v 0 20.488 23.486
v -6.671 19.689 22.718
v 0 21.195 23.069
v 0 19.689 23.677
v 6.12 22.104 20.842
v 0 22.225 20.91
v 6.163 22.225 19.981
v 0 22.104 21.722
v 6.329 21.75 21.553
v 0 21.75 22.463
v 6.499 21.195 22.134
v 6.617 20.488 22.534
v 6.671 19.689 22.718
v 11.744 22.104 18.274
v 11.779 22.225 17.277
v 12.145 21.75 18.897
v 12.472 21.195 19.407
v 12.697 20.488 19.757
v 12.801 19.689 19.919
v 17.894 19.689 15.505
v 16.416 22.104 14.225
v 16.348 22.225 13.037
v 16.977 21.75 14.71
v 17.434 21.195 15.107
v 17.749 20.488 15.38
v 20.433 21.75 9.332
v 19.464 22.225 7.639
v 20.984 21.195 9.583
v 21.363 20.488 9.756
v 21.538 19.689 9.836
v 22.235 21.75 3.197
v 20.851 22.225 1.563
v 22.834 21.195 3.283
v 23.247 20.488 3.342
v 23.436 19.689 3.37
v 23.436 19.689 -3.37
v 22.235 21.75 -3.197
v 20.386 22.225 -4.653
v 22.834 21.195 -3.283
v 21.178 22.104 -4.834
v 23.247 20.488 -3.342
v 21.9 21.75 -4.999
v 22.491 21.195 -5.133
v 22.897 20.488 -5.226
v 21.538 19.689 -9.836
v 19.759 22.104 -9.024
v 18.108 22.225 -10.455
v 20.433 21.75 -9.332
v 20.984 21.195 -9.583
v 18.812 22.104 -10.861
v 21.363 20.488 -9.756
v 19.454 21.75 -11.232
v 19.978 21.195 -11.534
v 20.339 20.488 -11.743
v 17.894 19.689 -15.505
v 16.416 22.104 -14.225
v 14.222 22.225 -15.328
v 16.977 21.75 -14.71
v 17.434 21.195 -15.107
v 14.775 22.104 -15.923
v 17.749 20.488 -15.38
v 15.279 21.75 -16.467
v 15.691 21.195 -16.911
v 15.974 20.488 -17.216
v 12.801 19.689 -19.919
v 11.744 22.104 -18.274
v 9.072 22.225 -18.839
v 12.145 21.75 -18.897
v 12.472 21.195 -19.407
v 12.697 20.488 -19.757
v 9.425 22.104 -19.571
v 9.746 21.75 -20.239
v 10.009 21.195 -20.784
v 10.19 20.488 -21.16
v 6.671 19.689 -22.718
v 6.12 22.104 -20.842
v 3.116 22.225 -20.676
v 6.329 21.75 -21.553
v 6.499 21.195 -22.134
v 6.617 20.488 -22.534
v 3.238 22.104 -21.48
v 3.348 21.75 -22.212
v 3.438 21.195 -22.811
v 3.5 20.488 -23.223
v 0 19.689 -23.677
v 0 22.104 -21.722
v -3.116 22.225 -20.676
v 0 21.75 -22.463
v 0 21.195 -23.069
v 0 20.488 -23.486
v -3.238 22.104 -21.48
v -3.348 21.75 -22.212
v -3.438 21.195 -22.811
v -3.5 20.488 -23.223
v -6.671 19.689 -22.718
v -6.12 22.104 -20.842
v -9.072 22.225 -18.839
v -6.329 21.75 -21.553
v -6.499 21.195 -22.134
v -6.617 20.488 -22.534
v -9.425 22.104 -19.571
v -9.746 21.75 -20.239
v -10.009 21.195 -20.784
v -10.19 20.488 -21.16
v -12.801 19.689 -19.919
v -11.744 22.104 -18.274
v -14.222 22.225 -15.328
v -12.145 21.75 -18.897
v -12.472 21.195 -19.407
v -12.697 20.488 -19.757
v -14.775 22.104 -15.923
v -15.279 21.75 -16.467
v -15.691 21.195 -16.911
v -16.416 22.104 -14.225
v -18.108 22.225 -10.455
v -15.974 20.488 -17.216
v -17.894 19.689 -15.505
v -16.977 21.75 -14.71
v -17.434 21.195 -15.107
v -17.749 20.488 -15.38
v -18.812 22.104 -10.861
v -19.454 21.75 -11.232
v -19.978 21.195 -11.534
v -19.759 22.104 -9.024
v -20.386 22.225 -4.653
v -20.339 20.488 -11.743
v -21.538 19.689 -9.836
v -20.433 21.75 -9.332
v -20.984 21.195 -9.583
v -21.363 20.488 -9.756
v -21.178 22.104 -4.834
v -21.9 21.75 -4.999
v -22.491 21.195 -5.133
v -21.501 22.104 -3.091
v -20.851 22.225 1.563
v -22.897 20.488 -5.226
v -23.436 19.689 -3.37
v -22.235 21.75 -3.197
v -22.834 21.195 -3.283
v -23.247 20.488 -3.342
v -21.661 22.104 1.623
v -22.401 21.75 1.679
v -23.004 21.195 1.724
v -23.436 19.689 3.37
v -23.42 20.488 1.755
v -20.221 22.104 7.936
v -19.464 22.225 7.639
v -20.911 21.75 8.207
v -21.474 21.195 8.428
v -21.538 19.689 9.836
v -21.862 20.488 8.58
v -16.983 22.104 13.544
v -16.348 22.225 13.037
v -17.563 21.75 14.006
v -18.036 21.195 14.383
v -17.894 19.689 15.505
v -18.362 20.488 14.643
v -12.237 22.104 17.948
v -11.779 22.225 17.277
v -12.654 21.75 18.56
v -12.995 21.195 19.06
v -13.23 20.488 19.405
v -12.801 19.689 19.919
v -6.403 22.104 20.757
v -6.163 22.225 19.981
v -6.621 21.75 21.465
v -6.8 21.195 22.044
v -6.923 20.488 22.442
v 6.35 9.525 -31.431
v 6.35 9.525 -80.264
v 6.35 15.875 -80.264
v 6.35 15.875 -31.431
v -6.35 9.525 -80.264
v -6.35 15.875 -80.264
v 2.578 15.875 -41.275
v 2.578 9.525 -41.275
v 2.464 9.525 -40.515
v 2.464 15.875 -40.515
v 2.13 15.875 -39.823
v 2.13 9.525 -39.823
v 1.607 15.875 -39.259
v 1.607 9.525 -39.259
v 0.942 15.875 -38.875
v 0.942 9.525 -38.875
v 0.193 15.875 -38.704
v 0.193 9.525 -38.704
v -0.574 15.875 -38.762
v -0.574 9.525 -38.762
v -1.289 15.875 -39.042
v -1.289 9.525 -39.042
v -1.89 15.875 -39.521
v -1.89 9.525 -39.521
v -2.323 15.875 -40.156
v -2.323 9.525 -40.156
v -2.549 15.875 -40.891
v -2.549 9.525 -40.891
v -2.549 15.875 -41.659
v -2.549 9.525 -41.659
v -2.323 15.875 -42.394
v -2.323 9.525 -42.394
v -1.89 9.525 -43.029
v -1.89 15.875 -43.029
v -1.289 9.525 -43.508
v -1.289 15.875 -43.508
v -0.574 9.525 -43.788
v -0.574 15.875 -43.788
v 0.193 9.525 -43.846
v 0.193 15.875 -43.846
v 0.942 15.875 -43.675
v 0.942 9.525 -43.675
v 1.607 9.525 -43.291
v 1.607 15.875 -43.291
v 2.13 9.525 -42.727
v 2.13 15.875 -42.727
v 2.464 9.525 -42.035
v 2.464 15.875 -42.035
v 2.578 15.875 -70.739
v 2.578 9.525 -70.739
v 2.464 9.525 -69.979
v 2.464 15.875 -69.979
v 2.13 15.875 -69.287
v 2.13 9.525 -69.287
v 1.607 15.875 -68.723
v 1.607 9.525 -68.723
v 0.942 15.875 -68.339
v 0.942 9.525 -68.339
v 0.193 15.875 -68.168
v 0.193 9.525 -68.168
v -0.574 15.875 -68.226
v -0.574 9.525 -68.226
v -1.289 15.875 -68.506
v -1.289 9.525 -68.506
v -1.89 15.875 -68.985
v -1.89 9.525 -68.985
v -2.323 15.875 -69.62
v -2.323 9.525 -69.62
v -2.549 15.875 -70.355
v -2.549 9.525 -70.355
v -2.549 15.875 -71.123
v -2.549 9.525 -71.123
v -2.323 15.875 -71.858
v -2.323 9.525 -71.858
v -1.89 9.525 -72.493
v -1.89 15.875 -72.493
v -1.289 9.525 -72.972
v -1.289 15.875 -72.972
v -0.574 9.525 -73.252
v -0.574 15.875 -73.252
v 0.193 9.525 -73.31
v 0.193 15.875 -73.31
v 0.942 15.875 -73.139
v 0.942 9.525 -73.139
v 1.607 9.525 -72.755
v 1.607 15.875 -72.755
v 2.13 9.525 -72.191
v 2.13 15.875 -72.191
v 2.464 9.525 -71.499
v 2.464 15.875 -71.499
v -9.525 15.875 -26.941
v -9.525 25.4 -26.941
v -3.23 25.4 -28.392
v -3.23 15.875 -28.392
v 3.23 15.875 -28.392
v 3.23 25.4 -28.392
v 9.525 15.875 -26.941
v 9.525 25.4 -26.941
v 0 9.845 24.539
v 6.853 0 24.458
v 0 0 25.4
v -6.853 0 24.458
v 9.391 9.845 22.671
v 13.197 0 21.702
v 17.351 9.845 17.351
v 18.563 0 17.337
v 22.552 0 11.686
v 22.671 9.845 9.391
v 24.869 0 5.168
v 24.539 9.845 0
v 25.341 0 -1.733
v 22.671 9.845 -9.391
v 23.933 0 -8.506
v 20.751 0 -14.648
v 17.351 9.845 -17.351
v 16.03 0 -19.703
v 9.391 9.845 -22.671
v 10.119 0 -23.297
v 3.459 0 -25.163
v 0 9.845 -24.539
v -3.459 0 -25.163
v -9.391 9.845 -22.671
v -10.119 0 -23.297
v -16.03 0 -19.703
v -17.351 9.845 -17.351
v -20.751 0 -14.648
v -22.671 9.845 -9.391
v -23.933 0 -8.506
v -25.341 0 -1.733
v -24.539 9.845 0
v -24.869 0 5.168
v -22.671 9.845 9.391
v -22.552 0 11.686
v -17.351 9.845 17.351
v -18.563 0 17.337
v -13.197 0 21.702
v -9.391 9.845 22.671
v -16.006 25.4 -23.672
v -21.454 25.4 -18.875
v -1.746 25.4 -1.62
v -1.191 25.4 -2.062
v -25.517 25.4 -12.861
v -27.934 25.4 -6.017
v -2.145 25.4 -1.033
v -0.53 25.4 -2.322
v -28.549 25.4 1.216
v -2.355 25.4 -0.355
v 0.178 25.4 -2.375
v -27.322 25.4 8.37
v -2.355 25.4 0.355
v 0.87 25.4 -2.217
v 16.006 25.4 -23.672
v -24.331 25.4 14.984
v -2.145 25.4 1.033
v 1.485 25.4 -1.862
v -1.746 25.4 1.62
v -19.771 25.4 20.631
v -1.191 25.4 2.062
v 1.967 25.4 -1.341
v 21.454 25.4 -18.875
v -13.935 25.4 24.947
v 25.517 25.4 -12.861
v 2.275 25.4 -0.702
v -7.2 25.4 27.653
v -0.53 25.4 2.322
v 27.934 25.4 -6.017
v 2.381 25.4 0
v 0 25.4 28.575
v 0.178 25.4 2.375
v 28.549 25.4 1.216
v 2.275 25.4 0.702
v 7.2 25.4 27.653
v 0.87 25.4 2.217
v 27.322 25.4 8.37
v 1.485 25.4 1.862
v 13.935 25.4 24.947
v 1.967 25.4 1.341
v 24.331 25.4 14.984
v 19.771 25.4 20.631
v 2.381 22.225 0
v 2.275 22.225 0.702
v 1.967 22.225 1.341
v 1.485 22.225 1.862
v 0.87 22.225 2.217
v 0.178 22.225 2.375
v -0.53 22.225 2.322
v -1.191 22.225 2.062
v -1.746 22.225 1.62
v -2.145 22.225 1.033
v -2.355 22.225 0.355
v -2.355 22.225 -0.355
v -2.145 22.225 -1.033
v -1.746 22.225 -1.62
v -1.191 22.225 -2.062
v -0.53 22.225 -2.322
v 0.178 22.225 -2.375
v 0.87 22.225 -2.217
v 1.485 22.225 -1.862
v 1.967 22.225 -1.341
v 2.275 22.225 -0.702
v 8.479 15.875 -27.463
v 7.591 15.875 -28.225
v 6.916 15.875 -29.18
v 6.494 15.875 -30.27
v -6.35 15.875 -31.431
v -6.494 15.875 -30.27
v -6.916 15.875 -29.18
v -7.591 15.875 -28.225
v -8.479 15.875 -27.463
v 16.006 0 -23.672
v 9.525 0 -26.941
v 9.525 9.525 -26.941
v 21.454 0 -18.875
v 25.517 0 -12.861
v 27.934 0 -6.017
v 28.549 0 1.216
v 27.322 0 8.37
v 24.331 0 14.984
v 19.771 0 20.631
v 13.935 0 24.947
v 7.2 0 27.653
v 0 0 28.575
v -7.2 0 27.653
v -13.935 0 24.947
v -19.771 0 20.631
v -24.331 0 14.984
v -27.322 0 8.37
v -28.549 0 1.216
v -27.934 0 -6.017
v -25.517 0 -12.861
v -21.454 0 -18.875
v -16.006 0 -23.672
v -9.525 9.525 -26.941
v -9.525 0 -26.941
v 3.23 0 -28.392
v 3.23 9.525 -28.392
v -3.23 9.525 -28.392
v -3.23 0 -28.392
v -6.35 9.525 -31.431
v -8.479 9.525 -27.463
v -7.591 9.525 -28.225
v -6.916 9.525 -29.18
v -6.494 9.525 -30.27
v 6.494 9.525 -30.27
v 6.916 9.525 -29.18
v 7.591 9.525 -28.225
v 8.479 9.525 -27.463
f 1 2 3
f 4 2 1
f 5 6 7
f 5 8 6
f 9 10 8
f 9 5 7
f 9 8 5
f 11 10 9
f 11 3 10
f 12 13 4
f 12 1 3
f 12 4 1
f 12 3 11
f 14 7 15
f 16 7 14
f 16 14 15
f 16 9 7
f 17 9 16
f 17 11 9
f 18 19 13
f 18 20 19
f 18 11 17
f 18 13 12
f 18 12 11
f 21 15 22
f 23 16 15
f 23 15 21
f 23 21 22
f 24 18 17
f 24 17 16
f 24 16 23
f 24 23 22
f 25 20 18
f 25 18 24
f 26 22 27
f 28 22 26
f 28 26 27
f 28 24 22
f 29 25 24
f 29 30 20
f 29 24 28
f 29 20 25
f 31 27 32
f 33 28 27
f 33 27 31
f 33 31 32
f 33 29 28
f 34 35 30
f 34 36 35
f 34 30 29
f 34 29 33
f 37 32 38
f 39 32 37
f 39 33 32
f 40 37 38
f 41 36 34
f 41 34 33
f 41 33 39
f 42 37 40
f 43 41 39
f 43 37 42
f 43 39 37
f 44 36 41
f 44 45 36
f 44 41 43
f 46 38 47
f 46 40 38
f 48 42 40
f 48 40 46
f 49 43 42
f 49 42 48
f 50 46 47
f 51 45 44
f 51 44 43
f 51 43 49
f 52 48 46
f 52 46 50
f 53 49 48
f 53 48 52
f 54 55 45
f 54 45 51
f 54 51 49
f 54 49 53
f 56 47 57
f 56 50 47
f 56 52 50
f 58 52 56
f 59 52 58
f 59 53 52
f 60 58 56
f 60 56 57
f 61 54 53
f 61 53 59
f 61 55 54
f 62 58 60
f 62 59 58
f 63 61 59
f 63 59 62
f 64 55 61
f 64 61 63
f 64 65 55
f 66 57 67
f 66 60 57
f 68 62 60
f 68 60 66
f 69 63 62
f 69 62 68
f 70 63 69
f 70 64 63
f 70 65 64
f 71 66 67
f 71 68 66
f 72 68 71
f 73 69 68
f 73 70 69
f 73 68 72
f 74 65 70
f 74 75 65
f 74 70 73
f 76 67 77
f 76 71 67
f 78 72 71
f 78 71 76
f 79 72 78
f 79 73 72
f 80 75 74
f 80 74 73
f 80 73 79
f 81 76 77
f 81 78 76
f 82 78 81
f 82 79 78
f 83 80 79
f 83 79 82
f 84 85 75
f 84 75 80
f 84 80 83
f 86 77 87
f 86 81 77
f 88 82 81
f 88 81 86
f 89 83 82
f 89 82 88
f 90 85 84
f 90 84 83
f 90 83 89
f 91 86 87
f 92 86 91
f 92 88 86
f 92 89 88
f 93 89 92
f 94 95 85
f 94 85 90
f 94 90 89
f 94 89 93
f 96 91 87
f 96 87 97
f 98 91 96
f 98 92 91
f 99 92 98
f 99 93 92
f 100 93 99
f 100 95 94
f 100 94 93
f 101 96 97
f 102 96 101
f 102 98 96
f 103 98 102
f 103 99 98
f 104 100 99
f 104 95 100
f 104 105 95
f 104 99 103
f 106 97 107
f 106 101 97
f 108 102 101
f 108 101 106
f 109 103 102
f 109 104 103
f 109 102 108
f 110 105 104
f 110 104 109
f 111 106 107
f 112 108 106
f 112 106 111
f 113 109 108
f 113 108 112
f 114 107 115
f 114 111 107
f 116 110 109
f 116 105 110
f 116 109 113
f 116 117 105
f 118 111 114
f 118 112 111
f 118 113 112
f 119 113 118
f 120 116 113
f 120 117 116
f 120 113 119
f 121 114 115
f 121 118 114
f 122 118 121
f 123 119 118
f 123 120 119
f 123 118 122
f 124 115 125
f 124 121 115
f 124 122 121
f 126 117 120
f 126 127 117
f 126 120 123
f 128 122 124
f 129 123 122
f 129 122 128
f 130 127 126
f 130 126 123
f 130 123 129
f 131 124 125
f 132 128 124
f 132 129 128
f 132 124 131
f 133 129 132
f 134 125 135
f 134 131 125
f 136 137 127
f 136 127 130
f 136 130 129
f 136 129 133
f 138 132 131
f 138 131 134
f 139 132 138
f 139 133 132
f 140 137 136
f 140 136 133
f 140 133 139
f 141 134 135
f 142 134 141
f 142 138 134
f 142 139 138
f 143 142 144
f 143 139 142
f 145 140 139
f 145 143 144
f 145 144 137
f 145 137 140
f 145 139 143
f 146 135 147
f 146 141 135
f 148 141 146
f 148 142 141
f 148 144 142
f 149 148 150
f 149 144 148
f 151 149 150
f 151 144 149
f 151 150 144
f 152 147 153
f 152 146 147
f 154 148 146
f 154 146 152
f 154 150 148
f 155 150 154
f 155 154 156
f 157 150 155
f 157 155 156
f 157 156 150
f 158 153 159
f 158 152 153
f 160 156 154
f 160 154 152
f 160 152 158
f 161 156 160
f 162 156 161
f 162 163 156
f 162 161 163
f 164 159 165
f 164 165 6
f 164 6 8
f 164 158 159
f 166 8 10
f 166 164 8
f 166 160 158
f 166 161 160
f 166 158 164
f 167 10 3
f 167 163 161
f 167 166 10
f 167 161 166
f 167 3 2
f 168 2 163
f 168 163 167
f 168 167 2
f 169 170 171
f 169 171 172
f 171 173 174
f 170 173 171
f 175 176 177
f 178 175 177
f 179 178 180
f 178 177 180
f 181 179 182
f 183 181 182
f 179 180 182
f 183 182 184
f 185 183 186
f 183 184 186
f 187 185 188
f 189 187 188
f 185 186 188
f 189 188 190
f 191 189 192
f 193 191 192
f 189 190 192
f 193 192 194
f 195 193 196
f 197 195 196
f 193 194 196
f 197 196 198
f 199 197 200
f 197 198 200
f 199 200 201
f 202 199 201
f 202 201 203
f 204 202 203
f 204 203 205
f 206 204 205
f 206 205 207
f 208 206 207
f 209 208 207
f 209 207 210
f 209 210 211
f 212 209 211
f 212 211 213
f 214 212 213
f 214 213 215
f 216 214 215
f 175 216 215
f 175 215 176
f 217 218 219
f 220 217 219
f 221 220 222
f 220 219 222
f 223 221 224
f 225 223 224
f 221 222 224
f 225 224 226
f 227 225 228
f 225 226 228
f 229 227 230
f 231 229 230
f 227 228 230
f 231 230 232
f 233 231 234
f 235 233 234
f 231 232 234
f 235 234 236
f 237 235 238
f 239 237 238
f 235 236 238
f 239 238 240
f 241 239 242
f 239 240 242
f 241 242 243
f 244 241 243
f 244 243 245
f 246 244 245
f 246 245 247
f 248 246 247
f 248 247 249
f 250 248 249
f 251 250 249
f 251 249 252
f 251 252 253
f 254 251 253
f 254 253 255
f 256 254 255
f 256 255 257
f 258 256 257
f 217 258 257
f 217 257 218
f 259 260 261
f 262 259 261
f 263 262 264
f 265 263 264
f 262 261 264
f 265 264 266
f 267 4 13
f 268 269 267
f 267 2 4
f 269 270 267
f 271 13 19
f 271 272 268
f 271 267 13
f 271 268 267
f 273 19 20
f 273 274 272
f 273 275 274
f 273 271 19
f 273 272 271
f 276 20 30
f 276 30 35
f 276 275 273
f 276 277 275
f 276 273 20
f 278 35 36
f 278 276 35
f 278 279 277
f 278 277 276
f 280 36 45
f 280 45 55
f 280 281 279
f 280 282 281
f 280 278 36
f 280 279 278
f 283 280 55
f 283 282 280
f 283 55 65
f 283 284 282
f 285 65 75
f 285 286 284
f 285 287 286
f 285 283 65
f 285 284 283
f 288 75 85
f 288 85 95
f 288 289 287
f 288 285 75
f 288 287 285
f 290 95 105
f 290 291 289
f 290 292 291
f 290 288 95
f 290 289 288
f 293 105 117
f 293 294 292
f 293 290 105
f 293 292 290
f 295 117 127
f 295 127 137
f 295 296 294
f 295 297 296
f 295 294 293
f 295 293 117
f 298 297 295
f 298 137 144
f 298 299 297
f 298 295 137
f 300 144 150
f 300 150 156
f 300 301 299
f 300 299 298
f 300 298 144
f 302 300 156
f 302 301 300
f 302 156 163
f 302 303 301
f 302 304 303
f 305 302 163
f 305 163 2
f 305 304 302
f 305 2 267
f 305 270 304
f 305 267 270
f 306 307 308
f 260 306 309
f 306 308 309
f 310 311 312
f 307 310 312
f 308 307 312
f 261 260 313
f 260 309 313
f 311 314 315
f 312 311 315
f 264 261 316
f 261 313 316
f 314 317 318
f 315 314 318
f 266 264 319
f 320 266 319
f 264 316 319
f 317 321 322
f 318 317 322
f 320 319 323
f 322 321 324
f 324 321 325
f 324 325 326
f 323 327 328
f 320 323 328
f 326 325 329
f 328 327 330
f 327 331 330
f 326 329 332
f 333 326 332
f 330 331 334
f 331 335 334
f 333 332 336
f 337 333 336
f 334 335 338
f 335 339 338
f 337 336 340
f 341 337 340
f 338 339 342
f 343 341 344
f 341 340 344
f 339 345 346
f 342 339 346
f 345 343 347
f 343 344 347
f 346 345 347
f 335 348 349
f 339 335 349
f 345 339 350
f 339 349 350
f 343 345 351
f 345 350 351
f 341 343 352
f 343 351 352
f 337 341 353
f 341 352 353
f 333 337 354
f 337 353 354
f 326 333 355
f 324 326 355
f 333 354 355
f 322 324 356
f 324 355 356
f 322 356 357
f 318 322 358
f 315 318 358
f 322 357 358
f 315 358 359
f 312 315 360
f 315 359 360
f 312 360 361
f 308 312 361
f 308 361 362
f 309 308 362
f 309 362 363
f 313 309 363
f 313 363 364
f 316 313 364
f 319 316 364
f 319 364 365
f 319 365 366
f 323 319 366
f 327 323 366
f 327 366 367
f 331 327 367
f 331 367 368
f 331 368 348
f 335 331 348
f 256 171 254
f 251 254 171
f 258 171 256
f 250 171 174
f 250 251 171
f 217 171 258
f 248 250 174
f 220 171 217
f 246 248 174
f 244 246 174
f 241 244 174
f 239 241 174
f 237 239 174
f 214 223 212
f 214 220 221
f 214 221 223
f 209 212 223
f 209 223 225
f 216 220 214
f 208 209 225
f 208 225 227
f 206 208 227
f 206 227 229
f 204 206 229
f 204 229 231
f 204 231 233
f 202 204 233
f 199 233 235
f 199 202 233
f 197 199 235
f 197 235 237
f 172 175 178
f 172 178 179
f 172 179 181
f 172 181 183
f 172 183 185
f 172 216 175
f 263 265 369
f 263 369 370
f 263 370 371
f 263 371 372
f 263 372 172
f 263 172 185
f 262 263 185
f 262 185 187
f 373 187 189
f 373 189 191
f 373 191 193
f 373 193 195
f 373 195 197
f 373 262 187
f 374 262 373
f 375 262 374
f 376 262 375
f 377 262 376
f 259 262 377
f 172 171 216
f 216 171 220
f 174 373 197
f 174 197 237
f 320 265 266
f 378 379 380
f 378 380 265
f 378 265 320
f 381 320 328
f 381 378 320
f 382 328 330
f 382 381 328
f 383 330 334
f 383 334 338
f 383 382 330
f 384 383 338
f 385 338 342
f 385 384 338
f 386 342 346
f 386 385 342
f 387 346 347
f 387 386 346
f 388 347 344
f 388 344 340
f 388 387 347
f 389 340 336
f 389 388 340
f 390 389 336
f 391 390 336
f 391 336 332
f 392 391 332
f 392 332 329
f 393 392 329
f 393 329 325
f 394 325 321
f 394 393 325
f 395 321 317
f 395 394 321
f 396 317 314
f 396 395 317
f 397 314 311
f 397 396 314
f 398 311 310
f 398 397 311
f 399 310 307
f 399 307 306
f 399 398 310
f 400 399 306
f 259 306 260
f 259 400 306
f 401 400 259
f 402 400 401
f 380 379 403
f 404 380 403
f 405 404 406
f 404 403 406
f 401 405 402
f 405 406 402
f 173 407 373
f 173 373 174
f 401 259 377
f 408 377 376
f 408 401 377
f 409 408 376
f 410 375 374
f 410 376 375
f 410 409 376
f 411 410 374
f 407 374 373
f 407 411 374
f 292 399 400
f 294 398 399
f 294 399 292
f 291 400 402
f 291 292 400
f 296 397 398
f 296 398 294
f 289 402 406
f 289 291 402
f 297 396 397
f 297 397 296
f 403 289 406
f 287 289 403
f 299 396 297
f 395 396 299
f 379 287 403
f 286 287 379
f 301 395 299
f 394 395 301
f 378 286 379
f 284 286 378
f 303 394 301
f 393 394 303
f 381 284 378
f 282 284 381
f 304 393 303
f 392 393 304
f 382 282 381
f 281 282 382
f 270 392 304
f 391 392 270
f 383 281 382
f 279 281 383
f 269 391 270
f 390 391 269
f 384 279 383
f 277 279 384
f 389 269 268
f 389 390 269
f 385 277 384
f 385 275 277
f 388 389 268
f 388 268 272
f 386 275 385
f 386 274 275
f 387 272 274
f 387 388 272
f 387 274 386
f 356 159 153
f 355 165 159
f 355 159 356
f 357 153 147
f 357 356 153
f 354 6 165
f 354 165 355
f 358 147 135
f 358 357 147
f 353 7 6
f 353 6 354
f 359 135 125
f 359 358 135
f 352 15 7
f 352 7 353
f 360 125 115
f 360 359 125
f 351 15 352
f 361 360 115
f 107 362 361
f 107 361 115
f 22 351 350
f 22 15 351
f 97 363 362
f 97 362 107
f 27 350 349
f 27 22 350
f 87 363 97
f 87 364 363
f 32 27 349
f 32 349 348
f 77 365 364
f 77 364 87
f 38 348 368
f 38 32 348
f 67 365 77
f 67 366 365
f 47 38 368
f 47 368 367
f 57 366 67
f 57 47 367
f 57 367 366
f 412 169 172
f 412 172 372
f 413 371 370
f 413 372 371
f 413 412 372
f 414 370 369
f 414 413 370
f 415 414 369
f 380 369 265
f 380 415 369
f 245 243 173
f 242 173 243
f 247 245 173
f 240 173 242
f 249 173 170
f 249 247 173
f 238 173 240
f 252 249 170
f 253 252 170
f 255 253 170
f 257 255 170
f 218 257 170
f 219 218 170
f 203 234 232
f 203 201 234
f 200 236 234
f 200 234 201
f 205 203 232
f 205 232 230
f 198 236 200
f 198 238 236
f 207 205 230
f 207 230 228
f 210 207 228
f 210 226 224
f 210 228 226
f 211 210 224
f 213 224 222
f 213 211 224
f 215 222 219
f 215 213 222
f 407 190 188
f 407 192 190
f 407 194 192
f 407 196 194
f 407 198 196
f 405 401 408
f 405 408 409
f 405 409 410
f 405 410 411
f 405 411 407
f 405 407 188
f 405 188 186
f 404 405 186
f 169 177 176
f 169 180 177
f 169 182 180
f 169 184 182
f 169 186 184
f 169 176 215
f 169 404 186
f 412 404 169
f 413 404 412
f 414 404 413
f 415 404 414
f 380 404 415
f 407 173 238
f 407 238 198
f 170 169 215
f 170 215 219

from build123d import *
from build123d import SkipClean  # not in build123d's __all__

# Parameters (mm, degrees)
F0_R     = 2.5781
F0_R_2   = 2.38125
F2_DEPTH = 25.4
F4_R     = 2.5781
F5_DEPTH = 9.525
F6_R     = 2.5781
F7_DEPTH = 9.525


with BuildPart() as f2:
    # F0 (on Front) → F2 (new body)
    with BuildSketch(Plane.XZ):
        with BuildLine():
            ThreePointArc((6.35, -31.4308964237), (7.2239350333, -28.6812657667), (9.525, -26.9407683632))
            ThreePointArc((9.525, -26.9407683632), (0, 28.575), (-9.525, -26.9407683632))
            ThreePointArc((-9.525, -26.9407683632), (-7.2239350333, -28.6812657667), (-6.35, -31.4308964237))
            Line((-6.35, -31.4308964237), (-6.35, -80.264))
            Line((-6.35, -80.264), (6.35, -80.264))
            Line((6.35, -80.264), (6.35, -31.4308964237))
        make_face()
        with Locations((0, -70.739)):
            Circle(F0_R, mode=Mode.SUBTRACT)
        with Locations((0, -41.275)):
            Circle(F0_R, mode=Mode.SUBTRACT)
        Circle(F0_R_2, mode=Mode.SUBTRACT)
    extrude(amount=-F2_DEPTH)

    # F1 (on Right) → F3 (revolve, cut)
    with BuildSketch(Plane.YZ):
        with BuildLine():
            Line((19.6890045478, 23.677435306), (0, 25.4))
            Line((0, 25.4), (0, 0))
            Line((0, 0), (22.225, 0))
            Line((22.225, 0), (22.225, 20.9098819103))
            ThreePointArc((22.225, 20.9098819103), (21.4951236013, 22.7867559559), (19.6890045478, 23.677435306))
        make_face()
    revolve(axis=Axis((0, 12.7, 0), (0, 1, 0)), mode=Mode.SUBTRACT)

    # F4 (on face) → F5 (cut)
    with BuildSketch(Plane.XZ):
        with BuildLine():
            ThreePointArc((9.525, -26.9407683632), (0, -28.575), (-9.525, -26.9407683632))
            ThreePointArc((-9.525, -26.9407683632), (-7.2239350333, -28.6812657667), (-6.35, -31.4308964237))
            Line((-6.35, -31.4308964237), (-6.35, -80.264))
            Line((-6.35, -80.264), (6.35, -80.264))
            Line((6.35, -80.264), (6.35, -31.4308964237))
            ThreePointArc((6.35, -31.4308964237), (7.2239350333, -28.6812657667), (9.525, -26.9407683632))
        make_face()
        with Locations((0, -70.739)):
            Circle(F4_R, mode=Mode.SUBTRACT)
        with Locations((0, -41.275)):
            Circle(F4_R, mode=Mode.SUBTRACT)
    with SkipClean():  # cleaning this boolean's faces spoils the solid; the shape is the same uncleaned
        extrude(amount=-F5_DEPTH, mode=Mode.SUBTRACT)

    # F6 (on face) → F7 (cut)
    with BuildSketch(Plane(origin=(0, 25.4, 0), x_dir=(-1, 0, 0), z_dir=(0, 1, 0))):
        with BuildLine():
            ThreePointArc((9.525, -26.9407683632), (0, -28.575), (-9.525, -26.9407683632))
            ThreePointArc((-9.525, -26.9407683632), (-7.2239350333, -28.6812657667), (-6.35, -31.4308964237))
            Line((-6.35, -31.4308964237), (-6.35, -80.264))
            Line((-6.35, -80.264), (6.35, -80.264))
            Line((6.35, -80.264), (6.35, -31.4308964237))
            ThreePointArc((6.35, -31.4308964237), (7.2239350333, -28.6812657667), (9.525, -26.9407683632))
        make_face()
        with Locations((0, -70.739)):
            Circle(F6_R, mode=Mode.SUBTRACT)
        with Locations((0, -41.275)):
            Circle(F6_R, mode=Mode.SUBTRACT)
    extrude(amount=-F7_DEPTH, mode=Mode.SUBTRACT)


solid = f2.part
